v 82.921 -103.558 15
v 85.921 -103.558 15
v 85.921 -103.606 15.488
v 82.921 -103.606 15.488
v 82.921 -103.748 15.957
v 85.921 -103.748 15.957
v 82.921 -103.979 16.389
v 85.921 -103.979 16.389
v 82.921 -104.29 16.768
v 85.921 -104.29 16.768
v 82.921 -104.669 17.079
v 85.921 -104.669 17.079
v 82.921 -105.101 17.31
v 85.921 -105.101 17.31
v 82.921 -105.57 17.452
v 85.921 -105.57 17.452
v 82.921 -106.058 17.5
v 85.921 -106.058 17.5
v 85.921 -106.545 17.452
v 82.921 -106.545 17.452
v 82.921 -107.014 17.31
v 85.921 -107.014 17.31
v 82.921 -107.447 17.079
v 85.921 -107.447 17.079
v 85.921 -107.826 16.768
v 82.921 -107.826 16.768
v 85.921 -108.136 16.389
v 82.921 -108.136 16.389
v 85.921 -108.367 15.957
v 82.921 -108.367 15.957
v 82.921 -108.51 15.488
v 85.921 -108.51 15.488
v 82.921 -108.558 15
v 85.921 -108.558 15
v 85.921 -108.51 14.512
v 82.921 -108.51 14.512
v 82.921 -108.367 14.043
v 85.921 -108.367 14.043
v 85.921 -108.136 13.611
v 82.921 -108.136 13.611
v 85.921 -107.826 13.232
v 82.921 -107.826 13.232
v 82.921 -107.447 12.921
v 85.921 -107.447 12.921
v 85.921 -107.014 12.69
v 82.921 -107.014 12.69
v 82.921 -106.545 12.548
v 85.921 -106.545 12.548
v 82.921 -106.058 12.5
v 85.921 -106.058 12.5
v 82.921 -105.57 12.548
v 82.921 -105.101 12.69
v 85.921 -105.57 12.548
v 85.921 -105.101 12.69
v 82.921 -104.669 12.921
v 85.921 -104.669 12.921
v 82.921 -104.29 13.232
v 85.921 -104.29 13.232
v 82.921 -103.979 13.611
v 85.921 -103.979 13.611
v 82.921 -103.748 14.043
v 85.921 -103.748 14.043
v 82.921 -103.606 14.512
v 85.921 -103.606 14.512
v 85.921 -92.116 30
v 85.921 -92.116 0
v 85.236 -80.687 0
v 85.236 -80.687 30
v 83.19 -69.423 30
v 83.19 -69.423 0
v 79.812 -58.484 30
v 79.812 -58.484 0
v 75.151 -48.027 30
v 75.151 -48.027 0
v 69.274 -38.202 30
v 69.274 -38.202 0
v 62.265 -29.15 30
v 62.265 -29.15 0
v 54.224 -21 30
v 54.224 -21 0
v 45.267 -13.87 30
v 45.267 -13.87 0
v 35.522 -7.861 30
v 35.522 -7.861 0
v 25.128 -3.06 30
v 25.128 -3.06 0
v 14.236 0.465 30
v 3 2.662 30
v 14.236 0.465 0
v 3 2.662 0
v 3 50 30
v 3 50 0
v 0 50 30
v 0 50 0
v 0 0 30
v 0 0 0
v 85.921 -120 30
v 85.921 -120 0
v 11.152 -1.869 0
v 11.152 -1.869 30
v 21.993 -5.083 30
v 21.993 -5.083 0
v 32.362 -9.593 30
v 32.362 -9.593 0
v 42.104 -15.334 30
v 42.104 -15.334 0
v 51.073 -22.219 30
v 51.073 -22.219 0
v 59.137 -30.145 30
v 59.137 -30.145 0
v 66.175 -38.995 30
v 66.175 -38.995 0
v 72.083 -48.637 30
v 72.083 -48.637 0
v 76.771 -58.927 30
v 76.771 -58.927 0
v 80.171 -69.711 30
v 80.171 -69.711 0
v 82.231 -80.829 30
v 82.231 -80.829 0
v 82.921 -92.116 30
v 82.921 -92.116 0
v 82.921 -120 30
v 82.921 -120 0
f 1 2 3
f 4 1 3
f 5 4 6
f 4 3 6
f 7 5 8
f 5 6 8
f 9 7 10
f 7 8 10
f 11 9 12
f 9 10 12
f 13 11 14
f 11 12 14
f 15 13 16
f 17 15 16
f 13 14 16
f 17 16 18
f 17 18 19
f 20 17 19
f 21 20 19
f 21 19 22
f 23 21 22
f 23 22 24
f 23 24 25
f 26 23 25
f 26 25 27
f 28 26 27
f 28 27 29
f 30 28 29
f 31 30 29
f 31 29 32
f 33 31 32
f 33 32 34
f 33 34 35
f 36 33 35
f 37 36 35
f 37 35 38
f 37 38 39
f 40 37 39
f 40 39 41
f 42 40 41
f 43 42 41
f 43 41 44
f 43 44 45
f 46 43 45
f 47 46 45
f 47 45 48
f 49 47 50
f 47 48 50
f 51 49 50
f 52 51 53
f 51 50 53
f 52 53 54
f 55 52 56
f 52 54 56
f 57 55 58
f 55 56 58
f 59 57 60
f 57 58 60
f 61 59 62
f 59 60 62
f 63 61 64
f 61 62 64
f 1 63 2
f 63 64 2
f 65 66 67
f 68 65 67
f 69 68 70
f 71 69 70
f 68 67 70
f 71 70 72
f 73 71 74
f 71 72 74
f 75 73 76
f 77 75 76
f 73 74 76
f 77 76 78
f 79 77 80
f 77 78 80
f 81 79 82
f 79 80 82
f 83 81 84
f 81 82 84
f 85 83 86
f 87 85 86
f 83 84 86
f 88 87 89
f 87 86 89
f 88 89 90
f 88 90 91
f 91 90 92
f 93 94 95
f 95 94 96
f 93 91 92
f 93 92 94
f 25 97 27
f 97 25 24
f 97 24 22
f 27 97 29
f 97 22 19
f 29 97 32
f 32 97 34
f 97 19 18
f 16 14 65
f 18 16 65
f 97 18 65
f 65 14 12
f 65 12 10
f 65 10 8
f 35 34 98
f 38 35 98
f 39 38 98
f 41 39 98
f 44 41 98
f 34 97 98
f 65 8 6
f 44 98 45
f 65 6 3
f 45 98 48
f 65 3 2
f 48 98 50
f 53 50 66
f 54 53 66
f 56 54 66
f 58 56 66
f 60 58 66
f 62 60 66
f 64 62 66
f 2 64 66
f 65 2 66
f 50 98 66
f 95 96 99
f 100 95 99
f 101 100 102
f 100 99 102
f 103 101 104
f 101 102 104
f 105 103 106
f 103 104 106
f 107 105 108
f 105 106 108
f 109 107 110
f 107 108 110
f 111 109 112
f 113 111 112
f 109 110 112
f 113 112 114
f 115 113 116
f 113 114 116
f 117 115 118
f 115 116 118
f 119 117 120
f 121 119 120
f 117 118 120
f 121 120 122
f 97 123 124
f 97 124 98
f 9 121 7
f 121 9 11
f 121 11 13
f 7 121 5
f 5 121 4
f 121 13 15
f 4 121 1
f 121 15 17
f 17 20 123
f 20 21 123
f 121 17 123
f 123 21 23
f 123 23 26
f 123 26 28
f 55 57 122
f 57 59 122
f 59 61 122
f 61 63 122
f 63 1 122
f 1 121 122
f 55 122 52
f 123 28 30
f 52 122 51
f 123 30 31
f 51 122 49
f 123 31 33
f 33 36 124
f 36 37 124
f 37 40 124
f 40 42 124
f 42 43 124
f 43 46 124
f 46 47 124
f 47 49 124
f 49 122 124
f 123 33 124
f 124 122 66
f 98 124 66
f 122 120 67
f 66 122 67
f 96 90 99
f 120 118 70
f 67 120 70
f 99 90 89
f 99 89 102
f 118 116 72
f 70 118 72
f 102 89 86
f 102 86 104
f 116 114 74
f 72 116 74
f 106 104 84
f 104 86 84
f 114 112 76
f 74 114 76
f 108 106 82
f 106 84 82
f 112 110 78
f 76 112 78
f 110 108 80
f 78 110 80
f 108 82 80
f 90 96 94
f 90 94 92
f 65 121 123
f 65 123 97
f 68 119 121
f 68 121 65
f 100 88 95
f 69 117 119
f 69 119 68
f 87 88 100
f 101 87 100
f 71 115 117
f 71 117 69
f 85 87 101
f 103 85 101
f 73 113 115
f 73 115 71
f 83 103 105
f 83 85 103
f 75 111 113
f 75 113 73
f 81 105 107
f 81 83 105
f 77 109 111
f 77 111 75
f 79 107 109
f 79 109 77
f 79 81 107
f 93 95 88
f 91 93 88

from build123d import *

# Parameters (mm, degrees)
BOSS_EXTRUDE1_DEPTH = 30
SKETCH2_R           = 2.5
CUT_EXTRUDE1_DEPTH  = 30


with BuildPart() as part:
    # Sketch1 → Boss-Extrude1 (new body)
    with BuildSketch(Plane.XY):
        with BuildLine():
            Line((0, 50), (0, 0))
            ThreePointArc((0, 0), (59.137285401, -30.145421821), (82.921098745, -92.115537233))
            Line((82.921098745, -92.115537233), (82.921098745, -120))
            Line((82.921098745, -120), (85.921098745, -120))
            Line((85.921098745, -120), (85.921098745, -92.115537233))
            ThreePointArc((85.921098745, -92.115537233), (62.264683971, -29.149857277), (3, 2.662090888))
            Line((3, 2.662090888), (3, 50))
            Line((3, 50), (0, 50))
        make_face()
    extrude(amount=BOSS_EXTRUDE1_DEPTH)

    # Sketch2 → Cut-Extrude1 (cut)
    with BuildSketch(Plane(origin=(85.921098745, 0, 0), x_dir=(0, 0, -1), z_dir=(1, 0, 0))):
        with Locations(Location((-15, -106.057768617, 0), (0, 0, 90))):
            Circle(SKETCH2_R)
    extrude(amount=-CUT_EXTRUDE1_DEPTH, mode=Mode.SUBTRACT)


solid = part.part
